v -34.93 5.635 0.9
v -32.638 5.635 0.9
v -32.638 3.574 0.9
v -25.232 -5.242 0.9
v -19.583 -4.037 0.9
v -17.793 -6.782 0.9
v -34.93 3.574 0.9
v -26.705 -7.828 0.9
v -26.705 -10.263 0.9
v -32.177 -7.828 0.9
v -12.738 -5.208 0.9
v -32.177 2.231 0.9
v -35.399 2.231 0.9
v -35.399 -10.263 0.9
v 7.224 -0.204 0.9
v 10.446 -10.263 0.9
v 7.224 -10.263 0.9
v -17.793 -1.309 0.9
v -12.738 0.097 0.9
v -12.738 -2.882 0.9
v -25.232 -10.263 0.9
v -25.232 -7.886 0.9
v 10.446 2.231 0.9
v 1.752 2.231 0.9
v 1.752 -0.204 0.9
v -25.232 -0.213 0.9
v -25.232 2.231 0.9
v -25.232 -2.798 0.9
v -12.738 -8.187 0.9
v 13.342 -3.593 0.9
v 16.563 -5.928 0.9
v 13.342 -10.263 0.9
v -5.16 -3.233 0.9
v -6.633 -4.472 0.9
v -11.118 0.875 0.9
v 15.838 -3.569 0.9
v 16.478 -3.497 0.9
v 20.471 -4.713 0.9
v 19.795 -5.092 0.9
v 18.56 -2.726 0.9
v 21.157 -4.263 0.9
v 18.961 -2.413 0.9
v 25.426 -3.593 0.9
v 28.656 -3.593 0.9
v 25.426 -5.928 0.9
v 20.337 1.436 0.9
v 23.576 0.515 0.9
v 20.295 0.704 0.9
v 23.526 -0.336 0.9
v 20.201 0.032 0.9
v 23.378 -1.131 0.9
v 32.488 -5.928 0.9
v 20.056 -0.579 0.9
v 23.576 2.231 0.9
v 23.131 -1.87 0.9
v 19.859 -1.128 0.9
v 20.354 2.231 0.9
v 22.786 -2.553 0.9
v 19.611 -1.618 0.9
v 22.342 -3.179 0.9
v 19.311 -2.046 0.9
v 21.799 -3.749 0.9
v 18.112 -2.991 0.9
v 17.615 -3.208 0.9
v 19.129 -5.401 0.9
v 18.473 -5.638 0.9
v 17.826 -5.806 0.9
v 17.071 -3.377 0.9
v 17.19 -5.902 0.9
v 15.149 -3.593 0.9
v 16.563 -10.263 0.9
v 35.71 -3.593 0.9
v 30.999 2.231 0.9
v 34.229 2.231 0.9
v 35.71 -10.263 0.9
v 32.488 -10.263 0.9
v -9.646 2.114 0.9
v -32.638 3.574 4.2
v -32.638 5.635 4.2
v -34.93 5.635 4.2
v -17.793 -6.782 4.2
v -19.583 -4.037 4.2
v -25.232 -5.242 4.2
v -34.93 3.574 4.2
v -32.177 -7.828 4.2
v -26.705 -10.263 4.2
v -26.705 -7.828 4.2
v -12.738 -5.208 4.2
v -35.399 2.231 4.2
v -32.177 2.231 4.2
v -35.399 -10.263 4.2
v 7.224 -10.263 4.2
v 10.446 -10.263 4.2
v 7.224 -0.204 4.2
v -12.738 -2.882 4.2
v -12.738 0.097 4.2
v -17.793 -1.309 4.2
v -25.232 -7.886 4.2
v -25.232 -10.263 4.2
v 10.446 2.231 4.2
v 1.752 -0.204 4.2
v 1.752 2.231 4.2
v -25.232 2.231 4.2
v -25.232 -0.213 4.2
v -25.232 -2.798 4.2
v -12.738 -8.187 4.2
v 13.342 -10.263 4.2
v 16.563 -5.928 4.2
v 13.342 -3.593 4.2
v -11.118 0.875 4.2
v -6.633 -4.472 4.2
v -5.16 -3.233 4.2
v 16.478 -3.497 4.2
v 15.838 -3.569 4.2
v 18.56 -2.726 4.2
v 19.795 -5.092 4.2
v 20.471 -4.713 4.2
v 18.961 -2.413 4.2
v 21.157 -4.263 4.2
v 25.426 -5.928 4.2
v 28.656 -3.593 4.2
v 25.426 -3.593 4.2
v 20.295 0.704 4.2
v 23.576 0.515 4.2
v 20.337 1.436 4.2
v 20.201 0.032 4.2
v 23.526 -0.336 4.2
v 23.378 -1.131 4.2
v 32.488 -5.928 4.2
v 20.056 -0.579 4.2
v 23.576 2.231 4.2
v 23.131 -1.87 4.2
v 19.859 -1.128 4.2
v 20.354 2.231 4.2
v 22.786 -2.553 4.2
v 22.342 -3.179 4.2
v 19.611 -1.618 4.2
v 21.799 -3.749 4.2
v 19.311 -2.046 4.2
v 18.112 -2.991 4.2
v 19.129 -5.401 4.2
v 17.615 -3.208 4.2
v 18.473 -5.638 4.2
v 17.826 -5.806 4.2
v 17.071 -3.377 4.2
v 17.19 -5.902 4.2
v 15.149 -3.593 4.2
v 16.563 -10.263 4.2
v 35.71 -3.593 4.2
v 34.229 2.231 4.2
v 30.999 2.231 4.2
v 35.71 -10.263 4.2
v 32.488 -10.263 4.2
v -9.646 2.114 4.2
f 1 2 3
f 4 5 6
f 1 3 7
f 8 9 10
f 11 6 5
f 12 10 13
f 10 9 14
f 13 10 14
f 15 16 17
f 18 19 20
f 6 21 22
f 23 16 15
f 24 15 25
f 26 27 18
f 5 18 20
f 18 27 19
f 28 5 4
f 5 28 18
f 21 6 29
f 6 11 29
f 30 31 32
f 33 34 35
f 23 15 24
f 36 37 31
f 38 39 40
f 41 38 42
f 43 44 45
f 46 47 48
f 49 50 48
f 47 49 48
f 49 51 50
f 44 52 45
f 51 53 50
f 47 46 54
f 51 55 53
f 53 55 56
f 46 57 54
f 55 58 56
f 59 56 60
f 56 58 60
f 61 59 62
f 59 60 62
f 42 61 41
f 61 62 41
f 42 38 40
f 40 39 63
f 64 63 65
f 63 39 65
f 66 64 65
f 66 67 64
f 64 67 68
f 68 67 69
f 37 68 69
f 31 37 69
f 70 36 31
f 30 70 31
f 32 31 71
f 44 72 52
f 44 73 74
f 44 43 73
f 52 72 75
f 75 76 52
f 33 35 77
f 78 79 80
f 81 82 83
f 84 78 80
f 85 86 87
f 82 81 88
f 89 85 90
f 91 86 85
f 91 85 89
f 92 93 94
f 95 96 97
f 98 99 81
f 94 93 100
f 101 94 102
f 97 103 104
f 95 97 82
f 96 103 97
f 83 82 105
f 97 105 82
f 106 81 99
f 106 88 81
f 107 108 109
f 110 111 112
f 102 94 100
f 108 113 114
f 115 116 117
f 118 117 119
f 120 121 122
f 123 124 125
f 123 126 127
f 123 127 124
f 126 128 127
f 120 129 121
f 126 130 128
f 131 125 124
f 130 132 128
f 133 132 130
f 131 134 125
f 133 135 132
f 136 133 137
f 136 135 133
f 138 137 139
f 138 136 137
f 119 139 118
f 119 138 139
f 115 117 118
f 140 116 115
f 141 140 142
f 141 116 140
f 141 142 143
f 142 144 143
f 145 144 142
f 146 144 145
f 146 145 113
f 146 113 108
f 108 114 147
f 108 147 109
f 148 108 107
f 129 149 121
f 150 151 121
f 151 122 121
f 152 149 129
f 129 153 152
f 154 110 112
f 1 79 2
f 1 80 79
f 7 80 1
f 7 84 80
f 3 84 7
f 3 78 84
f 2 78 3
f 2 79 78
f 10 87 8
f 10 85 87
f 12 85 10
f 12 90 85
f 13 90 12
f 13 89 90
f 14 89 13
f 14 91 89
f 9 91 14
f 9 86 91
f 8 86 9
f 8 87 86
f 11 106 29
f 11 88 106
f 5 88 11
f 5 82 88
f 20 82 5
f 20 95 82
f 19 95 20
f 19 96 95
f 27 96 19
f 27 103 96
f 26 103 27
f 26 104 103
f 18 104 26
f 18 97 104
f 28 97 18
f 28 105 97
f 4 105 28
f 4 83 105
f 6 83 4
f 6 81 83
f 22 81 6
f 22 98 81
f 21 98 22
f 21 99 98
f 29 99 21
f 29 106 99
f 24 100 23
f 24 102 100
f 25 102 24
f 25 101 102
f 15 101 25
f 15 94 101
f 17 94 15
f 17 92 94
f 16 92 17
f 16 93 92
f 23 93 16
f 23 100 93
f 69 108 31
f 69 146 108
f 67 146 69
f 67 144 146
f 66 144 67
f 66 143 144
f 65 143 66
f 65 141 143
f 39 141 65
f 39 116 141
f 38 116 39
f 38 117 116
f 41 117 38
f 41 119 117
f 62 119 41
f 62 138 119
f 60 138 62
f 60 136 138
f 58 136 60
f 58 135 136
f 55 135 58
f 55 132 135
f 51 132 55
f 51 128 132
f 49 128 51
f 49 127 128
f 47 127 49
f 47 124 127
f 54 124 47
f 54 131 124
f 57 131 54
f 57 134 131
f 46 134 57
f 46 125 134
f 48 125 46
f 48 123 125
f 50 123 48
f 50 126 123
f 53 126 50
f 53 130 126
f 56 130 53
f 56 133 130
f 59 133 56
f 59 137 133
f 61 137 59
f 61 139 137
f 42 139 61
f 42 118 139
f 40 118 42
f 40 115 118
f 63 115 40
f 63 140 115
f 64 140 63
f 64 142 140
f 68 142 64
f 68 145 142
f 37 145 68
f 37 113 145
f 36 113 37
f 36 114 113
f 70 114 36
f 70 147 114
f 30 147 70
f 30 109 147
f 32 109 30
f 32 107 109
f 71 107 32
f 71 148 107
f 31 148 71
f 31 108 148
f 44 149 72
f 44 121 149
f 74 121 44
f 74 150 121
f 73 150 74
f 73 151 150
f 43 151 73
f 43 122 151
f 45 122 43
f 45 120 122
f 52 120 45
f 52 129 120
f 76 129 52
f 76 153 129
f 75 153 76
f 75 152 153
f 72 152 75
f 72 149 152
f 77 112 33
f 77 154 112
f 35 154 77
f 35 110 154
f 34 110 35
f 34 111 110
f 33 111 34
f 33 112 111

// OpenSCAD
$fn = 48;
  // syllabics (overlaid on icon, tallest)
  translate([0, -2.500, 0.900]) linear_extrude(height=3.300) text("ᒫᕒᐠ ᒣᓯᔦ", size=12.340, halign="center", valign="center", font="Euphemia UCAS:style=Bold");
